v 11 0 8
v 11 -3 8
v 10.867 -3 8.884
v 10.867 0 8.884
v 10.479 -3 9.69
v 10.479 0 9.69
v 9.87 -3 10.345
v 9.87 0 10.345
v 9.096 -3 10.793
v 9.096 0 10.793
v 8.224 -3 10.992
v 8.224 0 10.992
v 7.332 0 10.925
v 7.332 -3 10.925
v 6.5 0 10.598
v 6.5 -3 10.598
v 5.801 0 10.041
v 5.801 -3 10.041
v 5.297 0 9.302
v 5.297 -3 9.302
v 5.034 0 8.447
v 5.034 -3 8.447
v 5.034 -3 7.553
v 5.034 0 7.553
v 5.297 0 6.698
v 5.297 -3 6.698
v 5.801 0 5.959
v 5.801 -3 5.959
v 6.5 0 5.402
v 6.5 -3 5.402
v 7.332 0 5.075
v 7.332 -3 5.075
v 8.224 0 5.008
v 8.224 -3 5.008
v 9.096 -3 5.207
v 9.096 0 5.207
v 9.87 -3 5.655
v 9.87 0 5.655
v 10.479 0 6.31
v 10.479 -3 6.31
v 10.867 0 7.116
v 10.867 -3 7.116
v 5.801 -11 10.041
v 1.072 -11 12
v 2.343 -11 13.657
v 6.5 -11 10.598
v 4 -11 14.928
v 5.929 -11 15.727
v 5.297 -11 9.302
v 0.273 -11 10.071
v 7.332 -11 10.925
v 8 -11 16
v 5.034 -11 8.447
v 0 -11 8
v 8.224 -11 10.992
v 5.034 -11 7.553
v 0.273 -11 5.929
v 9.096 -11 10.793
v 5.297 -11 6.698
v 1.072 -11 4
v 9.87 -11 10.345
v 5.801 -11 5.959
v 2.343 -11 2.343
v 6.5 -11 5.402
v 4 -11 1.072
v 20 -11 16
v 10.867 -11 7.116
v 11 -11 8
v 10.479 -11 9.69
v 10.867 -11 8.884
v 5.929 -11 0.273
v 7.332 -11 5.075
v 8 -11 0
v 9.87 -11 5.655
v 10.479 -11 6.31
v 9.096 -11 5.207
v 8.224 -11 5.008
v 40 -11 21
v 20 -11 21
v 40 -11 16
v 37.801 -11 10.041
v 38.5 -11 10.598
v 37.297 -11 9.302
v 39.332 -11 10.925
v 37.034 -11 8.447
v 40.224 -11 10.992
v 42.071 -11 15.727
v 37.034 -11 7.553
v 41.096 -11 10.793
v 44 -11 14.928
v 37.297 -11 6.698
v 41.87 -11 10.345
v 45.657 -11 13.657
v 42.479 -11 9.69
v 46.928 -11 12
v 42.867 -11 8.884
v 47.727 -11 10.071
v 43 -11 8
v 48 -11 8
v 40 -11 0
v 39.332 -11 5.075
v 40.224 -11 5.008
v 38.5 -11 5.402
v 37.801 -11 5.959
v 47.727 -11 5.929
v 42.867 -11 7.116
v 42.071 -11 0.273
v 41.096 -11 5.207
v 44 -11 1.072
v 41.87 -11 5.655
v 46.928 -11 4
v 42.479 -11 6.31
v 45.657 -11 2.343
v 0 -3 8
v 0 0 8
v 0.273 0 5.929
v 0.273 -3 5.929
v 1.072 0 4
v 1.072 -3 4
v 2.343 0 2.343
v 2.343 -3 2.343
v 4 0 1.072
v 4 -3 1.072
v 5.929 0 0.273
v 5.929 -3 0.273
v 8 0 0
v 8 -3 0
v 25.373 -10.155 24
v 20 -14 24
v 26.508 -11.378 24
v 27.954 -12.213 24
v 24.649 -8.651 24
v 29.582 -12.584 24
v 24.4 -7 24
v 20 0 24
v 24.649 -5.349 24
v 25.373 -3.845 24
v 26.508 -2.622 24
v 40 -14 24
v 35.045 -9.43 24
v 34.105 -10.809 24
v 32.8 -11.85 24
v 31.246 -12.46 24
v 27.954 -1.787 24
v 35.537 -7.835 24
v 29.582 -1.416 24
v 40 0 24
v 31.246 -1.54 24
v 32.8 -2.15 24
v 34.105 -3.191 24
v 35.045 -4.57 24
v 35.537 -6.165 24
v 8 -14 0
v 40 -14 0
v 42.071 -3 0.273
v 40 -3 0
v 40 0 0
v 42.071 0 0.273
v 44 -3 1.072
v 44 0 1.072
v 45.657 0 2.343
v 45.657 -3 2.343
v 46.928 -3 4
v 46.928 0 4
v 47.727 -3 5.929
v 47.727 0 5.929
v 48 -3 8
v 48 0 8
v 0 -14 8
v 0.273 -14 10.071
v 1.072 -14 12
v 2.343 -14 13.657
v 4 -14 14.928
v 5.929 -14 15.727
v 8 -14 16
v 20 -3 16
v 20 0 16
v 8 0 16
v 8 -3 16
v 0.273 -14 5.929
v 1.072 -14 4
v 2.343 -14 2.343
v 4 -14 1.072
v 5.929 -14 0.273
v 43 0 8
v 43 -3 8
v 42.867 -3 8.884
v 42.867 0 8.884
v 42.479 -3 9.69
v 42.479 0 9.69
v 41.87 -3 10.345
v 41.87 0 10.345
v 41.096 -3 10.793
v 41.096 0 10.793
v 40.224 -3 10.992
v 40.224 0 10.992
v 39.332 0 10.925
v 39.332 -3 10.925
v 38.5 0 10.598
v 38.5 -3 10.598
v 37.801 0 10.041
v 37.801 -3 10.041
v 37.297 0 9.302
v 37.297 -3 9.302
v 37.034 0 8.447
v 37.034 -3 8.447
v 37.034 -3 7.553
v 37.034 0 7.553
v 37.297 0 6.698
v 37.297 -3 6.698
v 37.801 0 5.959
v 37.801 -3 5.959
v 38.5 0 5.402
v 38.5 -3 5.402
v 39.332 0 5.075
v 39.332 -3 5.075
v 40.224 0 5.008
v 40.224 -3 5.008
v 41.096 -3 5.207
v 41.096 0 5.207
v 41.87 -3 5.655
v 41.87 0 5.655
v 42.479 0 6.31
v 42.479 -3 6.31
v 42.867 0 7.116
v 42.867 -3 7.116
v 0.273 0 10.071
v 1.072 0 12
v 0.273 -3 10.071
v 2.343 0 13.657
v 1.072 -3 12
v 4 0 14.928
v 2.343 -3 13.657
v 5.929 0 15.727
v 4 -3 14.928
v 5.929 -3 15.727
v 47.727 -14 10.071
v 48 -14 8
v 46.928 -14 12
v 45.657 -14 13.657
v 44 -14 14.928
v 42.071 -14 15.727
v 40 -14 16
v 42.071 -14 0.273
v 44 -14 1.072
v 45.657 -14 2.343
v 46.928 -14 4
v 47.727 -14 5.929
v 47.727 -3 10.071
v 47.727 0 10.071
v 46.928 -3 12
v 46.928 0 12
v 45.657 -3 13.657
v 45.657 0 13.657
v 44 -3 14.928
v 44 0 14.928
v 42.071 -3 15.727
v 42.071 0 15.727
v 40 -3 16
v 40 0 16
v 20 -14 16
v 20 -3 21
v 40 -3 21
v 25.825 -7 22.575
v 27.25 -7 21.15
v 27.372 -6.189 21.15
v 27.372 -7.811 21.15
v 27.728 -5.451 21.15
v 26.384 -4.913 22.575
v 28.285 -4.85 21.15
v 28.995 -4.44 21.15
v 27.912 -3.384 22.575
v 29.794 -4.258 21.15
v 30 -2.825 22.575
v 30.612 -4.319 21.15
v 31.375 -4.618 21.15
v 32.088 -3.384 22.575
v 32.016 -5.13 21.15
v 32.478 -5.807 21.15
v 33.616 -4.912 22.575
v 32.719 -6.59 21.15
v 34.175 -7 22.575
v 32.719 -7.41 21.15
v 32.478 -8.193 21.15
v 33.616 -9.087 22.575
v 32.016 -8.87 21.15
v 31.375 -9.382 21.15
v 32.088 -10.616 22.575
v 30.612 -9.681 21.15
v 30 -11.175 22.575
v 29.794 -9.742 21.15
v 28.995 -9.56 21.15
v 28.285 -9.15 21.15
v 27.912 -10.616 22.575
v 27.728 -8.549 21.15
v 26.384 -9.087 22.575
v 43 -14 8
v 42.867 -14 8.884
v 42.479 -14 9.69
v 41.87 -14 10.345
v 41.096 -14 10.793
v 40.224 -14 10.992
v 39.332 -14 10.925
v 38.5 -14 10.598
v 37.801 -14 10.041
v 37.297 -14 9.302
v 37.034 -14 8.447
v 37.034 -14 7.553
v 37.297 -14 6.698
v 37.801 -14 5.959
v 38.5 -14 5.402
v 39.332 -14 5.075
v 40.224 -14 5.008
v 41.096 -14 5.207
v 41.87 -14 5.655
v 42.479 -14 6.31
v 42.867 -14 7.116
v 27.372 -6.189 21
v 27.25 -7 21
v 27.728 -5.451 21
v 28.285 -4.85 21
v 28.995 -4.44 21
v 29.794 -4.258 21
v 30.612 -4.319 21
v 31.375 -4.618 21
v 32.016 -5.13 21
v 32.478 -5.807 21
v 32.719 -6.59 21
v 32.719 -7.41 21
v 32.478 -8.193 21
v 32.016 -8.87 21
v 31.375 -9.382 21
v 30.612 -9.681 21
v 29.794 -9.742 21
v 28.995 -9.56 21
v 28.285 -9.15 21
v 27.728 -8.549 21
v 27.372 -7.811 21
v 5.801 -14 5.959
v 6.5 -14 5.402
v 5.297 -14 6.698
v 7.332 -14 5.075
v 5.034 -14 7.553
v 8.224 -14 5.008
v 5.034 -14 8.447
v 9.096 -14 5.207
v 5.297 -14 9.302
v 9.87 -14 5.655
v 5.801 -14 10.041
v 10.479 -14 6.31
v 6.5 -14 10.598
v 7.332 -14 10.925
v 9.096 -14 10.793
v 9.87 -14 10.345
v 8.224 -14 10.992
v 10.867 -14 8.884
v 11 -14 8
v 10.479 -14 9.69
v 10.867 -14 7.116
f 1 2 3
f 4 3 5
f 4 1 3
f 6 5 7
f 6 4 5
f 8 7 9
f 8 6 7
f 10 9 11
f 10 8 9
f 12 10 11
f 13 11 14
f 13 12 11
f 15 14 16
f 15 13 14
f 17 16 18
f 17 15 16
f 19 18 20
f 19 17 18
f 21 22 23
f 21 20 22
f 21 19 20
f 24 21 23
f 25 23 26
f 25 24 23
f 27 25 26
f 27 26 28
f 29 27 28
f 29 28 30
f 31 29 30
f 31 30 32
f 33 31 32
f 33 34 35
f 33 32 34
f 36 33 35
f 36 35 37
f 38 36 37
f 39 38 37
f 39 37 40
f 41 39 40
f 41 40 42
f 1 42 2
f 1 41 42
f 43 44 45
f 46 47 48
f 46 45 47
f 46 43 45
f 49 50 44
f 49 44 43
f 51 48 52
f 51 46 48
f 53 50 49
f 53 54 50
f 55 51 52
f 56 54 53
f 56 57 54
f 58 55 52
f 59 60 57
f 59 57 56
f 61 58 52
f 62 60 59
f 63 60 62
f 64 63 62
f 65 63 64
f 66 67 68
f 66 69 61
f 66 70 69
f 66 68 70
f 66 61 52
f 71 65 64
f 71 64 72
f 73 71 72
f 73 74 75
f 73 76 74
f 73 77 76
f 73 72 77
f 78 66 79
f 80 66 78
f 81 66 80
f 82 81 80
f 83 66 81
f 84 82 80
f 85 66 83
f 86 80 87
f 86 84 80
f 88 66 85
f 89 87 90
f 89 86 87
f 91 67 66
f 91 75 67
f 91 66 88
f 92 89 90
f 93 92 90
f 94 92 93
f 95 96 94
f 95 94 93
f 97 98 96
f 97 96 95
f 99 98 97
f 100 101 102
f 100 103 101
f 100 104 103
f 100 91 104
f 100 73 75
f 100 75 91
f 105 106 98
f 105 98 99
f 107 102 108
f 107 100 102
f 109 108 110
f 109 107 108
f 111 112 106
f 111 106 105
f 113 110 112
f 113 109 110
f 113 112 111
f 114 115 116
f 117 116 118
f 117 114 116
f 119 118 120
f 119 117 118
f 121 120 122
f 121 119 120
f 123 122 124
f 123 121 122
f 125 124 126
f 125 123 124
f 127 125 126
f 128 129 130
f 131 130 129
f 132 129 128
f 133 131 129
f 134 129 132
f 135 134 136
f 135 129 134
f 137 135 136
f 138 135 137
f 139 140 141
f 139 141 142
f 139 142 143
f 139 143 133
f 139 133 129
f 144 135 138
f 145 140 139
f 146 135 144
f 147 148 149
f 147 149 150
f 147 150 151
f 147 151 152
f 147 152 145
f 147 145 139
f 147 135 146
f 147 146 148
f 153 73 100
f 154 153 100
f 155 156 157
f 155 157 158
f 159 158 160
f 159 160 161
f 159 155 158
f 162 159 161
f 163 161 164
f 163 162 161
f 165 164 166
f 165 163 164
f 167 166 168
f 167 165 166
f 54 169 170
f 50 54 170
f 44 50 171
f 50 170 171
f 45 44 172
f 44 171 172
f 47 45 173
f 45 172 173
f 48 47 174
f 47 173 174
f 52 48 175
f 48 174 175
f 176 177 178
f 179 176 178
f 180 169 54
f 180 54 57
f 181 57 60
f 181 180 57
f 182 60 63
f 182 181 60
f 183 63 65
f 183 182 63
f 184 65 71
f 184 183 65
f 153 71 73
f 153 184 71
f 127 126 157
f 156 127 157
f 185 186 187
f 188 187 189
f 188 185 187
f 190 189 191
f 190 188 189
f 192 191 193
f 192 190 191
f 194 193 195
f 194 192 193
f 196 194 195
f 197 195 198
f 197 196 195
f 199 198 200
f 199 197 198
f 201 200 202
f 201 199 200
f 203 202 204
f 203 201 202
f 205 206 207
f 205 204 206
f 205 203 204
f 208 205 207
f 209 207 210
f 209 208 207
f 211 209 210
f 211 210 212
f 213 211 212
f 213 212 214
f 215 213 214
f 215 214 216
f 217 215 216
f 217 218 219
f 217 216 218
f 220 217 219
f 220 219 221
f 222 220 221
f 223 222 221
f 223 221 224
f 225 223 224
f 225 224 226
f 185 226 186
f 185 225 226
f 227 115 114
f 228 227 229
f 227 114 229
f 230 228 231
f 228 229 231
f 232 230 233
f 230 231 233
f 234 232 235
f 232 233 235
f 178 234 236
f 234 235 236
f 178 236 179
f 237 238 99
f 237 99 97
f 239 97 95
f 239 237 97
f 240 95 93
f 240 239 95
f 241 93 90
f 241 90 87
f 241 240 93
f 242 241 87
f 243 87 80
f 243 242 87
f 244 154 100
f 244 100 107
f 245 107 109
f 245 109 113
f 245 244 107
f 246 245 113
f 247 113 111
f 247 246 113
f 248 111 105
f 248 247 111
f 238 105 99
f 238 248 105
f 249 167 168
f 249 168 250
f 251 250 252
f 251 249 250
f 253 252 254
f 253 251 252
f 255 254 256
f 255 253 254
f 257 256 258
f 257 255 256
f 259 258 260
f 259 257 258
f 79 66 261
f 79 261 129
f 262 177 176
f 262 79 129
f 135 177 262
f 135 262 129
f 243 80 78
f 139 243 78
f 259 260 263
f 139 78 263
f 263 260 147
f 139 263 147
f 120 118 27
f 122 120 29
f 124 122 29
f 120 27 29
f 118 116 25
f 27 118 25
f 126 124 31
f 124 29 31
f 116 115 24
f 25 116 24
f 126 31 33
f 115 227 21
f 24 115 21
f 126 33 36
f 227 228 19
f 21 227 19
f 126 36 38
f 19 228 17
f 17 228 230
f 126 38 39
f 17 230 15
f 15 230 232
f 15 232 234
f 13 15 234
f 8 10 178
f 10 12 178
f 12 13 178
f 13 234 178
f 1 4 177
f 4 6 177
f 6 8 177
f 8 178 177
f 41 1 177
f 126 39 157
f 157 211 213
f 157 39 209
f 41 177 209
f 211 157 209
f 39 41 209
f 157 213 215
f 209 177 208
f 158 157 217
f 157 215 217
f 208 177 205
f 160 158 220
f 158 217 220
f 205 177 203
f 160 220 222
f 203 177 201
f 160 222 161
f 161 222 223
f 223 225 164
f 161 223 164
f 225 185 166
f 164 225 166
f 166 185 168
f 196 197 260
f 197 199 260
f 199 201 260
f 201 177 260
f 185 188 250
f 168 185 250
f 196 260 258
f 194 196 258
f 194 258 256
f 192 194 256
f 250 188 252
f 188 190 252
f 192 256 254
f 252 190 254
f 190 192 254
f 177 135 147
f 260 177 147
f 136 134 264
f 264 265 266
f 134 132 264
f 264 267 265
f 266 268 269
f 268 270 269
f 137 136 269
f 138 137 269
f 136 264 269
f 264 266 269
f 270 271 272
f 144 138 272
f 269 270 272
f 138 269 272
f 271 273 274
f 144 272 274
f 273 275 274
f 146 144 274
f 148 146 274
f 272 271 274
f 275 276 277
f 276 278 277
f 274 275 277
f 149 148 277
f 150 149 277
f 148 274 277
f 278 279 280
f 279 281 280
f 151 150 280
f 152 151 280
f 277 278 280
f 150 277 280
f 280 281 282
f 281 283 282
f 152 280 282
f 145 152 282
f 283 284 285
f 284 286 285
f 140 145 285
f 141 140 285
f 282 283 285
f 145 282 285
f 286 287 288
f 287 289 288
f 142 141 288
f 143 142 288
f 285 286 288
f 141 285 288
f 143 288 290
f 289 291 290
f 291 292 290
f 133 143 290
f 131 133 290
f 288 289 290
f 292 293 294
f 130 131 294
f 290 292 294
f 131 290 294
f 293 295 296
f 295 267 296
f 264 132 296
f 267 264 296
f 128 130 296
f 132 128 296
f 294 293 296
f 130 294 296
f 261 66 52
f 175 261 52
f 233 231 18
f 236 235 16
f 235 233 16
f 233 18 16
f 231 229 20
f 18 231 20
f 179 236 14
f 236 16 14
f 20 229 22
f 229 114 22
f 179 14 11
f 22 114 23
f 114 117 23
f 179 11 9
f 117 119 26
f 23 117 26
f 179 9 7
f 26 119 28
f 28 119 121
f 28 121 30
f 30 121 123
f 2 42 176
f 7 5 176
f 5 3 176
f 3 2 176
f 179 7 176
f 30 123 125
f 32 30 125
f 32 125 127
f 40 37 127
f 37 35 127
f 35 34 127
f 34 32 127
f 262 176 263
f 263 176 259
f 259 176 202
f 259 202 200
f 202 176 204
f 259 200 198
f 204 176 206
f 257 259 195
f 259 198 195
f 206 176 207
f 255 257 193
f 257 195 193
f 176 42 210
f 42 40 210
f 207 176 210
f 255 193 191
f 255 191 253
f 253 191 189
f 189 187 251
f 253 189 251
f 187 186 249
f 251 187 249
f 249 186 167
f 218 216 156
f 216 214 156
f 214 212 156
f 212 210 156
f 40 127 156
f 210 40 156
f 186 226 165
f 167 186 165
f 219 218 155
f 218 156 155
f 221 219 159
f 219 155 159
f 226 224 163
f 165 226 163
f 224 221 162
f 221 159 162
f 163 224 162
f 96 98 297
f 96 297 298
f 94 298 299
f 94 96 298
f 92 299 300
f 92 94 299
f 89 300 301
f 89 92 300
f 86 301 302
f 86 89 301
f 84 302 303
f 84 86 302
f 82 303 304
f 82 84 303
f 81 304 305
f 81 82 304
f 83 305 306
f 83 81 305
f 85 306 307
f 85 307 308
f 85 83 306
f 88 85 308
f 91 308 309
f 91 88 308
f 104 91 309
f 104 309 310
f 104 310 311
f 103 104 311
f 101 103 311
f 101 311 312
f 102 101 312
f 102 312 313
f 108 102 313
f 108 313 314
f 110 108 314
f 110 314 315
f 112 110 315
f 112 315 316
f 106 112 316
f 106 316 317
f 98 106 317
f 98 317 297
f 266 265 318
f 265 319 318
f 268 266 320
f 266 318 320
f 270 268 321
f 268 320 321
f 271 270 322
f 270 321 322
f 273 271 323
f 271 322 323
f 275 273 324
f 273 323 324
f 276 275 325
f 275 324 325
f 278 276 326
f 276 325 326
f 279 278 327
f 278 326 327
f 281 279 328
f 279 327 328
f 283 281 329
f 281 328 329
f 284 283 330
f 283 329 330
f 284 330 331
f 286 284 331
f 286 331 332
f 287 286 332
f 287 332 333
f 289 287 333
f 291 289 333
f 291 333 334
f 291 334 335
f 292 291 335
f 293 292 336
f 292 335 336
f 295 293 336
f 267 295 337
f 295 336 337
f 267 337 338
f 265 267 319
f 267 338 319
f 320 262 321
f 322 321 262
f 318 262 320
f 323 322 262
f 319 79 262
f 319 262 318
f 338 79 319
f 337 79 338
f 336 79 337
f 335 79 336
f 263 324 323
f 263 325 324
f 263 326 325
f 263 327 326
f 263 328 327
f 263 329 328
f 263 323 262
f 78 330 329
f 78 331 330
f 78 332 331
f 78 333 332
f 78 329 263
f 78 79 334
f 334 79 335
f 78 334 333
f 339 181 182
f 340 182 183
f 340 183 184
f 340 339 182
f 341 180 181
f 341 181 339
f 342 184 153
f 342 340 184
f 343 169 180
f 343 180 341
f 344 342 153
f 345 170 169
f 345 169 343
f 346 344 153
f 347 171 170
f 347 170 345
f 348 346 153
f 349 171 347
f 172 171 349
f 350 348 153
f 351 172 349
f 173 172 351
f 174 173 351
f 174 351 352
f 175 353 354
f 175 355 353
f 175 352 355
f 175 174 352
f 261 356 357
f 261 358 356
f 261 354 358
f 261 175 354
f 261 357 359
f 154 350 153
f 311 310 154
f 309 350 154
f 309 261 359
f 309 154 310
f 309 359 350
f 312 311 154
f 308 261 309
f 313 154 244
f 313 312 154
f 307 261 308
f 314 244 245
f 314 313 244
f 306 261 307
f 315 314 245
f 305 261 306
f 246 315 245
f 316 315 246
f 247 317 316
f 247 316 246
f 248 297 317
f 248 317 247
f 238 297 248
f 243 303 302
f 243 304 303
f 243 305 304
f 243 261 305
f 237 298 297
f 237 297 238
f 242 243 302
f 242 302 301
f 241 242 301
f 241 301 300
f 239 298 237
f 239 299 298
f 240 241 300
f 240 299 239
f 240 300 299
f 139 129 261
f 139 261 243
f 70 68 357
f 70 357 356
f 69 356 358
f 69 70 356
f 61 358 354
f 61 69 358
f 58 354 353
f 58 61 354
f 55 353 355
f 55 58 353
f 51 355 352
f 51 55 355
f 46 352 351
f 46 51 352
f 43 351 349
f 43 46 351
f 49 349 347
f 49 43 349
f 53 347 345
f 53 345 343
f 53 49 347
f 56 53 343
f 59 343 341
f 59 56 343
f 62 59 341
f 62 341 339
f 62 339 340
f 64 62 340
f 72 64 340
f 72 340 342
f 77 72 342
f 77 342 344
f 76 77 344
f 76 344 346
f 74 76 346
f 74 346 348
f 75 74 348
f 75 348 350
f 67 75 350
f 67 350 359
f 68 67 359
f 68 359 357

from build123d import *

# Parameters (mm, degrees)
F0_R           = 3
F0_W           = 20
F0_H           = 8
F1_DEPTH       = 14
F2_R           = 7.99999
F3_W           = 62.9811411479
F3_H           = 8
F4_DEPTH       = 21
F6_D           = 5.5
F6_CSINK_D     = 11.2
F6_CSINK_ANGLE = 90


# Not quite as in the source:
# - a fillet or chamfer is up to 0.001 mm smaller than in the source, because OpenCascade refuses the exact size


with BuildPart() as f1:
    # F0 (on Front) → F1 (new body)
    with BuildSketch(Plane.XZ):
        Polygon((0, 16), (0, 0), (48, 0), (48, 16), (40, 16), (20, 16), align=None)
        with Locations((8, 8)):
            Circle(F0_R, mode=Mode.SUBTRACT)
        with Locations((40, 8)):
            Circle(F0_R, mode=Mode.SUBTRACT)
        with Locations((30, 20)):
            Rectangle(F0_W, F0_H)
    extrude(amount=F1_DEPTH)

    # F2 (radius 8 in the source; OpenCascade refuses exactly that, so slightly less here)
    f2_edges = [f1.edges().sort_by_distance(p)[0] for p in [
        (0, -7, 16),
        (0, -7, 0),
        (48, -7, 16),
        (48, -7, 0),
    ]]
    fillet(f2_edges, radius=F2_R)

    # F3 (on face) → F4 (cut)
    with BuildSketch(Plane(origin=(0, 0, 0), x_dir=(1, 0, 0), z_dir=(0, 0, -1))):
        with Locations((30.1177082001, 7)):
            Rectangle(F3_W, F3_H)
    extrude(amount=-F4_DEPTH, mode=Mode.SUBTRACT)

    # F6 (through all)
    with Locations(Plane.XY.offset(24)):
        with Locations((30, -7)):
            CounterSinkHole(F6_D / 2, F6_CSINK_D / 2, counter_sink_angle=F6_CSINK_ANGLE)


solid = f1.part
